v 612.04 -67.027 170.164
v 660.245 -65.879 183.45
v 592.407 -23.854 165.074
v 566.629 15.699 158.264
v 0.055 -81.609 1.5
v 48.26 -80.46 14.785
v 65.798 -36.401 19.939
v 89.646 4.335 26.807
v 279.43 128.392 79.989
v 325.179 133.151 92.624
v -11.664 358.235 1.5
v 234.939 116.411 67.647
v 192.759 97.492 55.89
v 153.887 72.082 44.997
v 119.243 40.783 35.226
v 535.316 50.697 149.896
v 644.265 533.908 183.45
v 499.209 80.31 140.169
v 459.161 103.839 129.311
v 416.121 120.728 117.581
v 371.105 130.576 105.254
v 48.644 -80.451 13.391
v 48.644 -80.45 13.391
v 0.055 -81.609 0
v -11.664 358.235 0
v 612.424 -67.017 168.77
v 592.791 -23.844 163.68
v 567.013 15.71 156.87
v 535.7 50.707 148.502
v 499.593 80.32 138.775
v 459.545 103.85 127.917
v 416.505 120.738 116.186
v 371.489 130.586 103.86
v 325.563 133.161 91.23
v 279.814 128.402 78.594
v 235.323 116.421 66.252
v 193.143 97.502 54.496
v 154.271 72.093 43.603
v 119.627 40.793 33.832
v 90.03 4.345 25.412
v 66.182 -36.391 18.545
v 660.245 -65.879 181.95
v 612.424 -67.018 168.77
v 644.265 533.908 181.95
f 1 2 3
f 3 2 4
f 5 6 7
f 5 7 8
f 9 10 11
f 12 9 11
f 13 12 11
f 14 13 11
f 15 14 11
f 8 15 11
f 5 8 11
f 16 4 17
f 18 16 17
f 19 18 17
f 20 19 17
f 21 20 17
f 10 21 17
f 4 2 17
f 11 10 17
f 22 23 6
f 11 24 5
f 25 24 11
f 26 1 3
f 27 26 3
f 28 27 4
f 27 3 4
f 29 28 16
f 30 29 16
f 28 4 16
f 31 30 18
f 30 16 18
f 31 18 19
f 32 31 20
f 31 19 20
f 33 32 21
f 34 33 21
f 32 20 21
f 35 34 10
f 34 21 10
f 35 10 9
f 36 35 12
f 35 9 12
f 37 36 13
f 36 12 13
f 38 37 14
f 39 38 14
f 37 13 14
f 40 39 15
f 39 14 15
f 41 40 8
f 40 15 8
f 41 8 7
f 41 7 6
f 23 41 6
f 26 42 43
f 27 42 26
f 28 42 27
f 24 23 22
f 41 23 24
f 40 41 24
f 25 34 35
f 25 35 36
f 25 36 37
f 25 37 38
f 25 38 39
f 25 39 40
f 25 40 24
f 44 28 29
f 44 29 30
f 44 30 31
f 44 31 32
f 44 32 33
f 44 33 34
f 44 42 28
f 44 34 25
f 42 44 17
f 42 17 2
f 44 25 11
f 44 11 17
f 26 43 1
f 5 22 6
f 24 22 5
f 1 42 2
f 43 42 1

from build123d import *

# Parameters (mm, degrees)
BOSS_EXTRUDE1_DEPTH = 1.5
CUT_EXTRUDE6_DEPTH  = 11.5
CUT_EXTRUDE7_DEPTH  = 11.5


with BuildPart() as part:
    # 3DSketch1 → Boss-Extrude1 (new, along a direction that is not the sketch's normal)
    with BuildSketch(Plane(origin=(-11.663984258, 358.235252064, 0), x_dir=(0.8242948566390451, -0.5203008813923206, 0.22321510285101764), z_dir=(-0.26553281531955075, -0.007074831163105001, 0.964075863587761))):
        Polygon((0, 0), (489.889504132, 504.199636792), (815.132069395, 0), (238.511214526, -369.746400314), align=None)
    extrude(amount=BOSS_EXTRUDE1_DEPTH, dir=(0, 0, 1))

    # Sketch2 → Cut-Extrude6 (cut)
    with BuildSketch(Plane(origin=(-0.533410404, -0.014212136, 1.936664949), x_dir=(0.9641018224173596, -0.0019485492019291684, 0.26552566574162595), z_dir=(-0.26553281531954953, -0.007074831163105186, 0.9640758635877613))):
        with BuildLine():
            ThreePointArc((635.382584147, -65.776722047), (337.840777347, 133.826895304), (50.610501363, -80.349432548))
            Line((50.610501363, -80.349432548), (635.382584147, -65.776722047))
        make_face()
    extrude(amount=-CUT_EXTRUDE6_DEPTH, mode=Mode.SUBTRACT)

    # Sketch3 → Cut-Extrude7 (cut)
    with BuildSketch(Plane(origin=(-0.533410404, -0.014212136, 1.936664949), x_dir=(0.9641018224173596, -0.0019485492019291684, 0.26552566574162595), z_dir=(-0.26553281531954953, -0.007074831163105186, 0.9640758635877613))):
        Polygon((50.610501363, -80.349432548), (50.610501363, -106.198699681), (633.779172918, -106.198699681), (635.382584147, -65.776722047), (592.923417402, -33.337692785), (162.965228398, -33.337692785), align=None)
    extrude(amount=-CUT_EXTRUDE7_DEPTH, mode=Mode.SUBTRACT)


solid = part.part
